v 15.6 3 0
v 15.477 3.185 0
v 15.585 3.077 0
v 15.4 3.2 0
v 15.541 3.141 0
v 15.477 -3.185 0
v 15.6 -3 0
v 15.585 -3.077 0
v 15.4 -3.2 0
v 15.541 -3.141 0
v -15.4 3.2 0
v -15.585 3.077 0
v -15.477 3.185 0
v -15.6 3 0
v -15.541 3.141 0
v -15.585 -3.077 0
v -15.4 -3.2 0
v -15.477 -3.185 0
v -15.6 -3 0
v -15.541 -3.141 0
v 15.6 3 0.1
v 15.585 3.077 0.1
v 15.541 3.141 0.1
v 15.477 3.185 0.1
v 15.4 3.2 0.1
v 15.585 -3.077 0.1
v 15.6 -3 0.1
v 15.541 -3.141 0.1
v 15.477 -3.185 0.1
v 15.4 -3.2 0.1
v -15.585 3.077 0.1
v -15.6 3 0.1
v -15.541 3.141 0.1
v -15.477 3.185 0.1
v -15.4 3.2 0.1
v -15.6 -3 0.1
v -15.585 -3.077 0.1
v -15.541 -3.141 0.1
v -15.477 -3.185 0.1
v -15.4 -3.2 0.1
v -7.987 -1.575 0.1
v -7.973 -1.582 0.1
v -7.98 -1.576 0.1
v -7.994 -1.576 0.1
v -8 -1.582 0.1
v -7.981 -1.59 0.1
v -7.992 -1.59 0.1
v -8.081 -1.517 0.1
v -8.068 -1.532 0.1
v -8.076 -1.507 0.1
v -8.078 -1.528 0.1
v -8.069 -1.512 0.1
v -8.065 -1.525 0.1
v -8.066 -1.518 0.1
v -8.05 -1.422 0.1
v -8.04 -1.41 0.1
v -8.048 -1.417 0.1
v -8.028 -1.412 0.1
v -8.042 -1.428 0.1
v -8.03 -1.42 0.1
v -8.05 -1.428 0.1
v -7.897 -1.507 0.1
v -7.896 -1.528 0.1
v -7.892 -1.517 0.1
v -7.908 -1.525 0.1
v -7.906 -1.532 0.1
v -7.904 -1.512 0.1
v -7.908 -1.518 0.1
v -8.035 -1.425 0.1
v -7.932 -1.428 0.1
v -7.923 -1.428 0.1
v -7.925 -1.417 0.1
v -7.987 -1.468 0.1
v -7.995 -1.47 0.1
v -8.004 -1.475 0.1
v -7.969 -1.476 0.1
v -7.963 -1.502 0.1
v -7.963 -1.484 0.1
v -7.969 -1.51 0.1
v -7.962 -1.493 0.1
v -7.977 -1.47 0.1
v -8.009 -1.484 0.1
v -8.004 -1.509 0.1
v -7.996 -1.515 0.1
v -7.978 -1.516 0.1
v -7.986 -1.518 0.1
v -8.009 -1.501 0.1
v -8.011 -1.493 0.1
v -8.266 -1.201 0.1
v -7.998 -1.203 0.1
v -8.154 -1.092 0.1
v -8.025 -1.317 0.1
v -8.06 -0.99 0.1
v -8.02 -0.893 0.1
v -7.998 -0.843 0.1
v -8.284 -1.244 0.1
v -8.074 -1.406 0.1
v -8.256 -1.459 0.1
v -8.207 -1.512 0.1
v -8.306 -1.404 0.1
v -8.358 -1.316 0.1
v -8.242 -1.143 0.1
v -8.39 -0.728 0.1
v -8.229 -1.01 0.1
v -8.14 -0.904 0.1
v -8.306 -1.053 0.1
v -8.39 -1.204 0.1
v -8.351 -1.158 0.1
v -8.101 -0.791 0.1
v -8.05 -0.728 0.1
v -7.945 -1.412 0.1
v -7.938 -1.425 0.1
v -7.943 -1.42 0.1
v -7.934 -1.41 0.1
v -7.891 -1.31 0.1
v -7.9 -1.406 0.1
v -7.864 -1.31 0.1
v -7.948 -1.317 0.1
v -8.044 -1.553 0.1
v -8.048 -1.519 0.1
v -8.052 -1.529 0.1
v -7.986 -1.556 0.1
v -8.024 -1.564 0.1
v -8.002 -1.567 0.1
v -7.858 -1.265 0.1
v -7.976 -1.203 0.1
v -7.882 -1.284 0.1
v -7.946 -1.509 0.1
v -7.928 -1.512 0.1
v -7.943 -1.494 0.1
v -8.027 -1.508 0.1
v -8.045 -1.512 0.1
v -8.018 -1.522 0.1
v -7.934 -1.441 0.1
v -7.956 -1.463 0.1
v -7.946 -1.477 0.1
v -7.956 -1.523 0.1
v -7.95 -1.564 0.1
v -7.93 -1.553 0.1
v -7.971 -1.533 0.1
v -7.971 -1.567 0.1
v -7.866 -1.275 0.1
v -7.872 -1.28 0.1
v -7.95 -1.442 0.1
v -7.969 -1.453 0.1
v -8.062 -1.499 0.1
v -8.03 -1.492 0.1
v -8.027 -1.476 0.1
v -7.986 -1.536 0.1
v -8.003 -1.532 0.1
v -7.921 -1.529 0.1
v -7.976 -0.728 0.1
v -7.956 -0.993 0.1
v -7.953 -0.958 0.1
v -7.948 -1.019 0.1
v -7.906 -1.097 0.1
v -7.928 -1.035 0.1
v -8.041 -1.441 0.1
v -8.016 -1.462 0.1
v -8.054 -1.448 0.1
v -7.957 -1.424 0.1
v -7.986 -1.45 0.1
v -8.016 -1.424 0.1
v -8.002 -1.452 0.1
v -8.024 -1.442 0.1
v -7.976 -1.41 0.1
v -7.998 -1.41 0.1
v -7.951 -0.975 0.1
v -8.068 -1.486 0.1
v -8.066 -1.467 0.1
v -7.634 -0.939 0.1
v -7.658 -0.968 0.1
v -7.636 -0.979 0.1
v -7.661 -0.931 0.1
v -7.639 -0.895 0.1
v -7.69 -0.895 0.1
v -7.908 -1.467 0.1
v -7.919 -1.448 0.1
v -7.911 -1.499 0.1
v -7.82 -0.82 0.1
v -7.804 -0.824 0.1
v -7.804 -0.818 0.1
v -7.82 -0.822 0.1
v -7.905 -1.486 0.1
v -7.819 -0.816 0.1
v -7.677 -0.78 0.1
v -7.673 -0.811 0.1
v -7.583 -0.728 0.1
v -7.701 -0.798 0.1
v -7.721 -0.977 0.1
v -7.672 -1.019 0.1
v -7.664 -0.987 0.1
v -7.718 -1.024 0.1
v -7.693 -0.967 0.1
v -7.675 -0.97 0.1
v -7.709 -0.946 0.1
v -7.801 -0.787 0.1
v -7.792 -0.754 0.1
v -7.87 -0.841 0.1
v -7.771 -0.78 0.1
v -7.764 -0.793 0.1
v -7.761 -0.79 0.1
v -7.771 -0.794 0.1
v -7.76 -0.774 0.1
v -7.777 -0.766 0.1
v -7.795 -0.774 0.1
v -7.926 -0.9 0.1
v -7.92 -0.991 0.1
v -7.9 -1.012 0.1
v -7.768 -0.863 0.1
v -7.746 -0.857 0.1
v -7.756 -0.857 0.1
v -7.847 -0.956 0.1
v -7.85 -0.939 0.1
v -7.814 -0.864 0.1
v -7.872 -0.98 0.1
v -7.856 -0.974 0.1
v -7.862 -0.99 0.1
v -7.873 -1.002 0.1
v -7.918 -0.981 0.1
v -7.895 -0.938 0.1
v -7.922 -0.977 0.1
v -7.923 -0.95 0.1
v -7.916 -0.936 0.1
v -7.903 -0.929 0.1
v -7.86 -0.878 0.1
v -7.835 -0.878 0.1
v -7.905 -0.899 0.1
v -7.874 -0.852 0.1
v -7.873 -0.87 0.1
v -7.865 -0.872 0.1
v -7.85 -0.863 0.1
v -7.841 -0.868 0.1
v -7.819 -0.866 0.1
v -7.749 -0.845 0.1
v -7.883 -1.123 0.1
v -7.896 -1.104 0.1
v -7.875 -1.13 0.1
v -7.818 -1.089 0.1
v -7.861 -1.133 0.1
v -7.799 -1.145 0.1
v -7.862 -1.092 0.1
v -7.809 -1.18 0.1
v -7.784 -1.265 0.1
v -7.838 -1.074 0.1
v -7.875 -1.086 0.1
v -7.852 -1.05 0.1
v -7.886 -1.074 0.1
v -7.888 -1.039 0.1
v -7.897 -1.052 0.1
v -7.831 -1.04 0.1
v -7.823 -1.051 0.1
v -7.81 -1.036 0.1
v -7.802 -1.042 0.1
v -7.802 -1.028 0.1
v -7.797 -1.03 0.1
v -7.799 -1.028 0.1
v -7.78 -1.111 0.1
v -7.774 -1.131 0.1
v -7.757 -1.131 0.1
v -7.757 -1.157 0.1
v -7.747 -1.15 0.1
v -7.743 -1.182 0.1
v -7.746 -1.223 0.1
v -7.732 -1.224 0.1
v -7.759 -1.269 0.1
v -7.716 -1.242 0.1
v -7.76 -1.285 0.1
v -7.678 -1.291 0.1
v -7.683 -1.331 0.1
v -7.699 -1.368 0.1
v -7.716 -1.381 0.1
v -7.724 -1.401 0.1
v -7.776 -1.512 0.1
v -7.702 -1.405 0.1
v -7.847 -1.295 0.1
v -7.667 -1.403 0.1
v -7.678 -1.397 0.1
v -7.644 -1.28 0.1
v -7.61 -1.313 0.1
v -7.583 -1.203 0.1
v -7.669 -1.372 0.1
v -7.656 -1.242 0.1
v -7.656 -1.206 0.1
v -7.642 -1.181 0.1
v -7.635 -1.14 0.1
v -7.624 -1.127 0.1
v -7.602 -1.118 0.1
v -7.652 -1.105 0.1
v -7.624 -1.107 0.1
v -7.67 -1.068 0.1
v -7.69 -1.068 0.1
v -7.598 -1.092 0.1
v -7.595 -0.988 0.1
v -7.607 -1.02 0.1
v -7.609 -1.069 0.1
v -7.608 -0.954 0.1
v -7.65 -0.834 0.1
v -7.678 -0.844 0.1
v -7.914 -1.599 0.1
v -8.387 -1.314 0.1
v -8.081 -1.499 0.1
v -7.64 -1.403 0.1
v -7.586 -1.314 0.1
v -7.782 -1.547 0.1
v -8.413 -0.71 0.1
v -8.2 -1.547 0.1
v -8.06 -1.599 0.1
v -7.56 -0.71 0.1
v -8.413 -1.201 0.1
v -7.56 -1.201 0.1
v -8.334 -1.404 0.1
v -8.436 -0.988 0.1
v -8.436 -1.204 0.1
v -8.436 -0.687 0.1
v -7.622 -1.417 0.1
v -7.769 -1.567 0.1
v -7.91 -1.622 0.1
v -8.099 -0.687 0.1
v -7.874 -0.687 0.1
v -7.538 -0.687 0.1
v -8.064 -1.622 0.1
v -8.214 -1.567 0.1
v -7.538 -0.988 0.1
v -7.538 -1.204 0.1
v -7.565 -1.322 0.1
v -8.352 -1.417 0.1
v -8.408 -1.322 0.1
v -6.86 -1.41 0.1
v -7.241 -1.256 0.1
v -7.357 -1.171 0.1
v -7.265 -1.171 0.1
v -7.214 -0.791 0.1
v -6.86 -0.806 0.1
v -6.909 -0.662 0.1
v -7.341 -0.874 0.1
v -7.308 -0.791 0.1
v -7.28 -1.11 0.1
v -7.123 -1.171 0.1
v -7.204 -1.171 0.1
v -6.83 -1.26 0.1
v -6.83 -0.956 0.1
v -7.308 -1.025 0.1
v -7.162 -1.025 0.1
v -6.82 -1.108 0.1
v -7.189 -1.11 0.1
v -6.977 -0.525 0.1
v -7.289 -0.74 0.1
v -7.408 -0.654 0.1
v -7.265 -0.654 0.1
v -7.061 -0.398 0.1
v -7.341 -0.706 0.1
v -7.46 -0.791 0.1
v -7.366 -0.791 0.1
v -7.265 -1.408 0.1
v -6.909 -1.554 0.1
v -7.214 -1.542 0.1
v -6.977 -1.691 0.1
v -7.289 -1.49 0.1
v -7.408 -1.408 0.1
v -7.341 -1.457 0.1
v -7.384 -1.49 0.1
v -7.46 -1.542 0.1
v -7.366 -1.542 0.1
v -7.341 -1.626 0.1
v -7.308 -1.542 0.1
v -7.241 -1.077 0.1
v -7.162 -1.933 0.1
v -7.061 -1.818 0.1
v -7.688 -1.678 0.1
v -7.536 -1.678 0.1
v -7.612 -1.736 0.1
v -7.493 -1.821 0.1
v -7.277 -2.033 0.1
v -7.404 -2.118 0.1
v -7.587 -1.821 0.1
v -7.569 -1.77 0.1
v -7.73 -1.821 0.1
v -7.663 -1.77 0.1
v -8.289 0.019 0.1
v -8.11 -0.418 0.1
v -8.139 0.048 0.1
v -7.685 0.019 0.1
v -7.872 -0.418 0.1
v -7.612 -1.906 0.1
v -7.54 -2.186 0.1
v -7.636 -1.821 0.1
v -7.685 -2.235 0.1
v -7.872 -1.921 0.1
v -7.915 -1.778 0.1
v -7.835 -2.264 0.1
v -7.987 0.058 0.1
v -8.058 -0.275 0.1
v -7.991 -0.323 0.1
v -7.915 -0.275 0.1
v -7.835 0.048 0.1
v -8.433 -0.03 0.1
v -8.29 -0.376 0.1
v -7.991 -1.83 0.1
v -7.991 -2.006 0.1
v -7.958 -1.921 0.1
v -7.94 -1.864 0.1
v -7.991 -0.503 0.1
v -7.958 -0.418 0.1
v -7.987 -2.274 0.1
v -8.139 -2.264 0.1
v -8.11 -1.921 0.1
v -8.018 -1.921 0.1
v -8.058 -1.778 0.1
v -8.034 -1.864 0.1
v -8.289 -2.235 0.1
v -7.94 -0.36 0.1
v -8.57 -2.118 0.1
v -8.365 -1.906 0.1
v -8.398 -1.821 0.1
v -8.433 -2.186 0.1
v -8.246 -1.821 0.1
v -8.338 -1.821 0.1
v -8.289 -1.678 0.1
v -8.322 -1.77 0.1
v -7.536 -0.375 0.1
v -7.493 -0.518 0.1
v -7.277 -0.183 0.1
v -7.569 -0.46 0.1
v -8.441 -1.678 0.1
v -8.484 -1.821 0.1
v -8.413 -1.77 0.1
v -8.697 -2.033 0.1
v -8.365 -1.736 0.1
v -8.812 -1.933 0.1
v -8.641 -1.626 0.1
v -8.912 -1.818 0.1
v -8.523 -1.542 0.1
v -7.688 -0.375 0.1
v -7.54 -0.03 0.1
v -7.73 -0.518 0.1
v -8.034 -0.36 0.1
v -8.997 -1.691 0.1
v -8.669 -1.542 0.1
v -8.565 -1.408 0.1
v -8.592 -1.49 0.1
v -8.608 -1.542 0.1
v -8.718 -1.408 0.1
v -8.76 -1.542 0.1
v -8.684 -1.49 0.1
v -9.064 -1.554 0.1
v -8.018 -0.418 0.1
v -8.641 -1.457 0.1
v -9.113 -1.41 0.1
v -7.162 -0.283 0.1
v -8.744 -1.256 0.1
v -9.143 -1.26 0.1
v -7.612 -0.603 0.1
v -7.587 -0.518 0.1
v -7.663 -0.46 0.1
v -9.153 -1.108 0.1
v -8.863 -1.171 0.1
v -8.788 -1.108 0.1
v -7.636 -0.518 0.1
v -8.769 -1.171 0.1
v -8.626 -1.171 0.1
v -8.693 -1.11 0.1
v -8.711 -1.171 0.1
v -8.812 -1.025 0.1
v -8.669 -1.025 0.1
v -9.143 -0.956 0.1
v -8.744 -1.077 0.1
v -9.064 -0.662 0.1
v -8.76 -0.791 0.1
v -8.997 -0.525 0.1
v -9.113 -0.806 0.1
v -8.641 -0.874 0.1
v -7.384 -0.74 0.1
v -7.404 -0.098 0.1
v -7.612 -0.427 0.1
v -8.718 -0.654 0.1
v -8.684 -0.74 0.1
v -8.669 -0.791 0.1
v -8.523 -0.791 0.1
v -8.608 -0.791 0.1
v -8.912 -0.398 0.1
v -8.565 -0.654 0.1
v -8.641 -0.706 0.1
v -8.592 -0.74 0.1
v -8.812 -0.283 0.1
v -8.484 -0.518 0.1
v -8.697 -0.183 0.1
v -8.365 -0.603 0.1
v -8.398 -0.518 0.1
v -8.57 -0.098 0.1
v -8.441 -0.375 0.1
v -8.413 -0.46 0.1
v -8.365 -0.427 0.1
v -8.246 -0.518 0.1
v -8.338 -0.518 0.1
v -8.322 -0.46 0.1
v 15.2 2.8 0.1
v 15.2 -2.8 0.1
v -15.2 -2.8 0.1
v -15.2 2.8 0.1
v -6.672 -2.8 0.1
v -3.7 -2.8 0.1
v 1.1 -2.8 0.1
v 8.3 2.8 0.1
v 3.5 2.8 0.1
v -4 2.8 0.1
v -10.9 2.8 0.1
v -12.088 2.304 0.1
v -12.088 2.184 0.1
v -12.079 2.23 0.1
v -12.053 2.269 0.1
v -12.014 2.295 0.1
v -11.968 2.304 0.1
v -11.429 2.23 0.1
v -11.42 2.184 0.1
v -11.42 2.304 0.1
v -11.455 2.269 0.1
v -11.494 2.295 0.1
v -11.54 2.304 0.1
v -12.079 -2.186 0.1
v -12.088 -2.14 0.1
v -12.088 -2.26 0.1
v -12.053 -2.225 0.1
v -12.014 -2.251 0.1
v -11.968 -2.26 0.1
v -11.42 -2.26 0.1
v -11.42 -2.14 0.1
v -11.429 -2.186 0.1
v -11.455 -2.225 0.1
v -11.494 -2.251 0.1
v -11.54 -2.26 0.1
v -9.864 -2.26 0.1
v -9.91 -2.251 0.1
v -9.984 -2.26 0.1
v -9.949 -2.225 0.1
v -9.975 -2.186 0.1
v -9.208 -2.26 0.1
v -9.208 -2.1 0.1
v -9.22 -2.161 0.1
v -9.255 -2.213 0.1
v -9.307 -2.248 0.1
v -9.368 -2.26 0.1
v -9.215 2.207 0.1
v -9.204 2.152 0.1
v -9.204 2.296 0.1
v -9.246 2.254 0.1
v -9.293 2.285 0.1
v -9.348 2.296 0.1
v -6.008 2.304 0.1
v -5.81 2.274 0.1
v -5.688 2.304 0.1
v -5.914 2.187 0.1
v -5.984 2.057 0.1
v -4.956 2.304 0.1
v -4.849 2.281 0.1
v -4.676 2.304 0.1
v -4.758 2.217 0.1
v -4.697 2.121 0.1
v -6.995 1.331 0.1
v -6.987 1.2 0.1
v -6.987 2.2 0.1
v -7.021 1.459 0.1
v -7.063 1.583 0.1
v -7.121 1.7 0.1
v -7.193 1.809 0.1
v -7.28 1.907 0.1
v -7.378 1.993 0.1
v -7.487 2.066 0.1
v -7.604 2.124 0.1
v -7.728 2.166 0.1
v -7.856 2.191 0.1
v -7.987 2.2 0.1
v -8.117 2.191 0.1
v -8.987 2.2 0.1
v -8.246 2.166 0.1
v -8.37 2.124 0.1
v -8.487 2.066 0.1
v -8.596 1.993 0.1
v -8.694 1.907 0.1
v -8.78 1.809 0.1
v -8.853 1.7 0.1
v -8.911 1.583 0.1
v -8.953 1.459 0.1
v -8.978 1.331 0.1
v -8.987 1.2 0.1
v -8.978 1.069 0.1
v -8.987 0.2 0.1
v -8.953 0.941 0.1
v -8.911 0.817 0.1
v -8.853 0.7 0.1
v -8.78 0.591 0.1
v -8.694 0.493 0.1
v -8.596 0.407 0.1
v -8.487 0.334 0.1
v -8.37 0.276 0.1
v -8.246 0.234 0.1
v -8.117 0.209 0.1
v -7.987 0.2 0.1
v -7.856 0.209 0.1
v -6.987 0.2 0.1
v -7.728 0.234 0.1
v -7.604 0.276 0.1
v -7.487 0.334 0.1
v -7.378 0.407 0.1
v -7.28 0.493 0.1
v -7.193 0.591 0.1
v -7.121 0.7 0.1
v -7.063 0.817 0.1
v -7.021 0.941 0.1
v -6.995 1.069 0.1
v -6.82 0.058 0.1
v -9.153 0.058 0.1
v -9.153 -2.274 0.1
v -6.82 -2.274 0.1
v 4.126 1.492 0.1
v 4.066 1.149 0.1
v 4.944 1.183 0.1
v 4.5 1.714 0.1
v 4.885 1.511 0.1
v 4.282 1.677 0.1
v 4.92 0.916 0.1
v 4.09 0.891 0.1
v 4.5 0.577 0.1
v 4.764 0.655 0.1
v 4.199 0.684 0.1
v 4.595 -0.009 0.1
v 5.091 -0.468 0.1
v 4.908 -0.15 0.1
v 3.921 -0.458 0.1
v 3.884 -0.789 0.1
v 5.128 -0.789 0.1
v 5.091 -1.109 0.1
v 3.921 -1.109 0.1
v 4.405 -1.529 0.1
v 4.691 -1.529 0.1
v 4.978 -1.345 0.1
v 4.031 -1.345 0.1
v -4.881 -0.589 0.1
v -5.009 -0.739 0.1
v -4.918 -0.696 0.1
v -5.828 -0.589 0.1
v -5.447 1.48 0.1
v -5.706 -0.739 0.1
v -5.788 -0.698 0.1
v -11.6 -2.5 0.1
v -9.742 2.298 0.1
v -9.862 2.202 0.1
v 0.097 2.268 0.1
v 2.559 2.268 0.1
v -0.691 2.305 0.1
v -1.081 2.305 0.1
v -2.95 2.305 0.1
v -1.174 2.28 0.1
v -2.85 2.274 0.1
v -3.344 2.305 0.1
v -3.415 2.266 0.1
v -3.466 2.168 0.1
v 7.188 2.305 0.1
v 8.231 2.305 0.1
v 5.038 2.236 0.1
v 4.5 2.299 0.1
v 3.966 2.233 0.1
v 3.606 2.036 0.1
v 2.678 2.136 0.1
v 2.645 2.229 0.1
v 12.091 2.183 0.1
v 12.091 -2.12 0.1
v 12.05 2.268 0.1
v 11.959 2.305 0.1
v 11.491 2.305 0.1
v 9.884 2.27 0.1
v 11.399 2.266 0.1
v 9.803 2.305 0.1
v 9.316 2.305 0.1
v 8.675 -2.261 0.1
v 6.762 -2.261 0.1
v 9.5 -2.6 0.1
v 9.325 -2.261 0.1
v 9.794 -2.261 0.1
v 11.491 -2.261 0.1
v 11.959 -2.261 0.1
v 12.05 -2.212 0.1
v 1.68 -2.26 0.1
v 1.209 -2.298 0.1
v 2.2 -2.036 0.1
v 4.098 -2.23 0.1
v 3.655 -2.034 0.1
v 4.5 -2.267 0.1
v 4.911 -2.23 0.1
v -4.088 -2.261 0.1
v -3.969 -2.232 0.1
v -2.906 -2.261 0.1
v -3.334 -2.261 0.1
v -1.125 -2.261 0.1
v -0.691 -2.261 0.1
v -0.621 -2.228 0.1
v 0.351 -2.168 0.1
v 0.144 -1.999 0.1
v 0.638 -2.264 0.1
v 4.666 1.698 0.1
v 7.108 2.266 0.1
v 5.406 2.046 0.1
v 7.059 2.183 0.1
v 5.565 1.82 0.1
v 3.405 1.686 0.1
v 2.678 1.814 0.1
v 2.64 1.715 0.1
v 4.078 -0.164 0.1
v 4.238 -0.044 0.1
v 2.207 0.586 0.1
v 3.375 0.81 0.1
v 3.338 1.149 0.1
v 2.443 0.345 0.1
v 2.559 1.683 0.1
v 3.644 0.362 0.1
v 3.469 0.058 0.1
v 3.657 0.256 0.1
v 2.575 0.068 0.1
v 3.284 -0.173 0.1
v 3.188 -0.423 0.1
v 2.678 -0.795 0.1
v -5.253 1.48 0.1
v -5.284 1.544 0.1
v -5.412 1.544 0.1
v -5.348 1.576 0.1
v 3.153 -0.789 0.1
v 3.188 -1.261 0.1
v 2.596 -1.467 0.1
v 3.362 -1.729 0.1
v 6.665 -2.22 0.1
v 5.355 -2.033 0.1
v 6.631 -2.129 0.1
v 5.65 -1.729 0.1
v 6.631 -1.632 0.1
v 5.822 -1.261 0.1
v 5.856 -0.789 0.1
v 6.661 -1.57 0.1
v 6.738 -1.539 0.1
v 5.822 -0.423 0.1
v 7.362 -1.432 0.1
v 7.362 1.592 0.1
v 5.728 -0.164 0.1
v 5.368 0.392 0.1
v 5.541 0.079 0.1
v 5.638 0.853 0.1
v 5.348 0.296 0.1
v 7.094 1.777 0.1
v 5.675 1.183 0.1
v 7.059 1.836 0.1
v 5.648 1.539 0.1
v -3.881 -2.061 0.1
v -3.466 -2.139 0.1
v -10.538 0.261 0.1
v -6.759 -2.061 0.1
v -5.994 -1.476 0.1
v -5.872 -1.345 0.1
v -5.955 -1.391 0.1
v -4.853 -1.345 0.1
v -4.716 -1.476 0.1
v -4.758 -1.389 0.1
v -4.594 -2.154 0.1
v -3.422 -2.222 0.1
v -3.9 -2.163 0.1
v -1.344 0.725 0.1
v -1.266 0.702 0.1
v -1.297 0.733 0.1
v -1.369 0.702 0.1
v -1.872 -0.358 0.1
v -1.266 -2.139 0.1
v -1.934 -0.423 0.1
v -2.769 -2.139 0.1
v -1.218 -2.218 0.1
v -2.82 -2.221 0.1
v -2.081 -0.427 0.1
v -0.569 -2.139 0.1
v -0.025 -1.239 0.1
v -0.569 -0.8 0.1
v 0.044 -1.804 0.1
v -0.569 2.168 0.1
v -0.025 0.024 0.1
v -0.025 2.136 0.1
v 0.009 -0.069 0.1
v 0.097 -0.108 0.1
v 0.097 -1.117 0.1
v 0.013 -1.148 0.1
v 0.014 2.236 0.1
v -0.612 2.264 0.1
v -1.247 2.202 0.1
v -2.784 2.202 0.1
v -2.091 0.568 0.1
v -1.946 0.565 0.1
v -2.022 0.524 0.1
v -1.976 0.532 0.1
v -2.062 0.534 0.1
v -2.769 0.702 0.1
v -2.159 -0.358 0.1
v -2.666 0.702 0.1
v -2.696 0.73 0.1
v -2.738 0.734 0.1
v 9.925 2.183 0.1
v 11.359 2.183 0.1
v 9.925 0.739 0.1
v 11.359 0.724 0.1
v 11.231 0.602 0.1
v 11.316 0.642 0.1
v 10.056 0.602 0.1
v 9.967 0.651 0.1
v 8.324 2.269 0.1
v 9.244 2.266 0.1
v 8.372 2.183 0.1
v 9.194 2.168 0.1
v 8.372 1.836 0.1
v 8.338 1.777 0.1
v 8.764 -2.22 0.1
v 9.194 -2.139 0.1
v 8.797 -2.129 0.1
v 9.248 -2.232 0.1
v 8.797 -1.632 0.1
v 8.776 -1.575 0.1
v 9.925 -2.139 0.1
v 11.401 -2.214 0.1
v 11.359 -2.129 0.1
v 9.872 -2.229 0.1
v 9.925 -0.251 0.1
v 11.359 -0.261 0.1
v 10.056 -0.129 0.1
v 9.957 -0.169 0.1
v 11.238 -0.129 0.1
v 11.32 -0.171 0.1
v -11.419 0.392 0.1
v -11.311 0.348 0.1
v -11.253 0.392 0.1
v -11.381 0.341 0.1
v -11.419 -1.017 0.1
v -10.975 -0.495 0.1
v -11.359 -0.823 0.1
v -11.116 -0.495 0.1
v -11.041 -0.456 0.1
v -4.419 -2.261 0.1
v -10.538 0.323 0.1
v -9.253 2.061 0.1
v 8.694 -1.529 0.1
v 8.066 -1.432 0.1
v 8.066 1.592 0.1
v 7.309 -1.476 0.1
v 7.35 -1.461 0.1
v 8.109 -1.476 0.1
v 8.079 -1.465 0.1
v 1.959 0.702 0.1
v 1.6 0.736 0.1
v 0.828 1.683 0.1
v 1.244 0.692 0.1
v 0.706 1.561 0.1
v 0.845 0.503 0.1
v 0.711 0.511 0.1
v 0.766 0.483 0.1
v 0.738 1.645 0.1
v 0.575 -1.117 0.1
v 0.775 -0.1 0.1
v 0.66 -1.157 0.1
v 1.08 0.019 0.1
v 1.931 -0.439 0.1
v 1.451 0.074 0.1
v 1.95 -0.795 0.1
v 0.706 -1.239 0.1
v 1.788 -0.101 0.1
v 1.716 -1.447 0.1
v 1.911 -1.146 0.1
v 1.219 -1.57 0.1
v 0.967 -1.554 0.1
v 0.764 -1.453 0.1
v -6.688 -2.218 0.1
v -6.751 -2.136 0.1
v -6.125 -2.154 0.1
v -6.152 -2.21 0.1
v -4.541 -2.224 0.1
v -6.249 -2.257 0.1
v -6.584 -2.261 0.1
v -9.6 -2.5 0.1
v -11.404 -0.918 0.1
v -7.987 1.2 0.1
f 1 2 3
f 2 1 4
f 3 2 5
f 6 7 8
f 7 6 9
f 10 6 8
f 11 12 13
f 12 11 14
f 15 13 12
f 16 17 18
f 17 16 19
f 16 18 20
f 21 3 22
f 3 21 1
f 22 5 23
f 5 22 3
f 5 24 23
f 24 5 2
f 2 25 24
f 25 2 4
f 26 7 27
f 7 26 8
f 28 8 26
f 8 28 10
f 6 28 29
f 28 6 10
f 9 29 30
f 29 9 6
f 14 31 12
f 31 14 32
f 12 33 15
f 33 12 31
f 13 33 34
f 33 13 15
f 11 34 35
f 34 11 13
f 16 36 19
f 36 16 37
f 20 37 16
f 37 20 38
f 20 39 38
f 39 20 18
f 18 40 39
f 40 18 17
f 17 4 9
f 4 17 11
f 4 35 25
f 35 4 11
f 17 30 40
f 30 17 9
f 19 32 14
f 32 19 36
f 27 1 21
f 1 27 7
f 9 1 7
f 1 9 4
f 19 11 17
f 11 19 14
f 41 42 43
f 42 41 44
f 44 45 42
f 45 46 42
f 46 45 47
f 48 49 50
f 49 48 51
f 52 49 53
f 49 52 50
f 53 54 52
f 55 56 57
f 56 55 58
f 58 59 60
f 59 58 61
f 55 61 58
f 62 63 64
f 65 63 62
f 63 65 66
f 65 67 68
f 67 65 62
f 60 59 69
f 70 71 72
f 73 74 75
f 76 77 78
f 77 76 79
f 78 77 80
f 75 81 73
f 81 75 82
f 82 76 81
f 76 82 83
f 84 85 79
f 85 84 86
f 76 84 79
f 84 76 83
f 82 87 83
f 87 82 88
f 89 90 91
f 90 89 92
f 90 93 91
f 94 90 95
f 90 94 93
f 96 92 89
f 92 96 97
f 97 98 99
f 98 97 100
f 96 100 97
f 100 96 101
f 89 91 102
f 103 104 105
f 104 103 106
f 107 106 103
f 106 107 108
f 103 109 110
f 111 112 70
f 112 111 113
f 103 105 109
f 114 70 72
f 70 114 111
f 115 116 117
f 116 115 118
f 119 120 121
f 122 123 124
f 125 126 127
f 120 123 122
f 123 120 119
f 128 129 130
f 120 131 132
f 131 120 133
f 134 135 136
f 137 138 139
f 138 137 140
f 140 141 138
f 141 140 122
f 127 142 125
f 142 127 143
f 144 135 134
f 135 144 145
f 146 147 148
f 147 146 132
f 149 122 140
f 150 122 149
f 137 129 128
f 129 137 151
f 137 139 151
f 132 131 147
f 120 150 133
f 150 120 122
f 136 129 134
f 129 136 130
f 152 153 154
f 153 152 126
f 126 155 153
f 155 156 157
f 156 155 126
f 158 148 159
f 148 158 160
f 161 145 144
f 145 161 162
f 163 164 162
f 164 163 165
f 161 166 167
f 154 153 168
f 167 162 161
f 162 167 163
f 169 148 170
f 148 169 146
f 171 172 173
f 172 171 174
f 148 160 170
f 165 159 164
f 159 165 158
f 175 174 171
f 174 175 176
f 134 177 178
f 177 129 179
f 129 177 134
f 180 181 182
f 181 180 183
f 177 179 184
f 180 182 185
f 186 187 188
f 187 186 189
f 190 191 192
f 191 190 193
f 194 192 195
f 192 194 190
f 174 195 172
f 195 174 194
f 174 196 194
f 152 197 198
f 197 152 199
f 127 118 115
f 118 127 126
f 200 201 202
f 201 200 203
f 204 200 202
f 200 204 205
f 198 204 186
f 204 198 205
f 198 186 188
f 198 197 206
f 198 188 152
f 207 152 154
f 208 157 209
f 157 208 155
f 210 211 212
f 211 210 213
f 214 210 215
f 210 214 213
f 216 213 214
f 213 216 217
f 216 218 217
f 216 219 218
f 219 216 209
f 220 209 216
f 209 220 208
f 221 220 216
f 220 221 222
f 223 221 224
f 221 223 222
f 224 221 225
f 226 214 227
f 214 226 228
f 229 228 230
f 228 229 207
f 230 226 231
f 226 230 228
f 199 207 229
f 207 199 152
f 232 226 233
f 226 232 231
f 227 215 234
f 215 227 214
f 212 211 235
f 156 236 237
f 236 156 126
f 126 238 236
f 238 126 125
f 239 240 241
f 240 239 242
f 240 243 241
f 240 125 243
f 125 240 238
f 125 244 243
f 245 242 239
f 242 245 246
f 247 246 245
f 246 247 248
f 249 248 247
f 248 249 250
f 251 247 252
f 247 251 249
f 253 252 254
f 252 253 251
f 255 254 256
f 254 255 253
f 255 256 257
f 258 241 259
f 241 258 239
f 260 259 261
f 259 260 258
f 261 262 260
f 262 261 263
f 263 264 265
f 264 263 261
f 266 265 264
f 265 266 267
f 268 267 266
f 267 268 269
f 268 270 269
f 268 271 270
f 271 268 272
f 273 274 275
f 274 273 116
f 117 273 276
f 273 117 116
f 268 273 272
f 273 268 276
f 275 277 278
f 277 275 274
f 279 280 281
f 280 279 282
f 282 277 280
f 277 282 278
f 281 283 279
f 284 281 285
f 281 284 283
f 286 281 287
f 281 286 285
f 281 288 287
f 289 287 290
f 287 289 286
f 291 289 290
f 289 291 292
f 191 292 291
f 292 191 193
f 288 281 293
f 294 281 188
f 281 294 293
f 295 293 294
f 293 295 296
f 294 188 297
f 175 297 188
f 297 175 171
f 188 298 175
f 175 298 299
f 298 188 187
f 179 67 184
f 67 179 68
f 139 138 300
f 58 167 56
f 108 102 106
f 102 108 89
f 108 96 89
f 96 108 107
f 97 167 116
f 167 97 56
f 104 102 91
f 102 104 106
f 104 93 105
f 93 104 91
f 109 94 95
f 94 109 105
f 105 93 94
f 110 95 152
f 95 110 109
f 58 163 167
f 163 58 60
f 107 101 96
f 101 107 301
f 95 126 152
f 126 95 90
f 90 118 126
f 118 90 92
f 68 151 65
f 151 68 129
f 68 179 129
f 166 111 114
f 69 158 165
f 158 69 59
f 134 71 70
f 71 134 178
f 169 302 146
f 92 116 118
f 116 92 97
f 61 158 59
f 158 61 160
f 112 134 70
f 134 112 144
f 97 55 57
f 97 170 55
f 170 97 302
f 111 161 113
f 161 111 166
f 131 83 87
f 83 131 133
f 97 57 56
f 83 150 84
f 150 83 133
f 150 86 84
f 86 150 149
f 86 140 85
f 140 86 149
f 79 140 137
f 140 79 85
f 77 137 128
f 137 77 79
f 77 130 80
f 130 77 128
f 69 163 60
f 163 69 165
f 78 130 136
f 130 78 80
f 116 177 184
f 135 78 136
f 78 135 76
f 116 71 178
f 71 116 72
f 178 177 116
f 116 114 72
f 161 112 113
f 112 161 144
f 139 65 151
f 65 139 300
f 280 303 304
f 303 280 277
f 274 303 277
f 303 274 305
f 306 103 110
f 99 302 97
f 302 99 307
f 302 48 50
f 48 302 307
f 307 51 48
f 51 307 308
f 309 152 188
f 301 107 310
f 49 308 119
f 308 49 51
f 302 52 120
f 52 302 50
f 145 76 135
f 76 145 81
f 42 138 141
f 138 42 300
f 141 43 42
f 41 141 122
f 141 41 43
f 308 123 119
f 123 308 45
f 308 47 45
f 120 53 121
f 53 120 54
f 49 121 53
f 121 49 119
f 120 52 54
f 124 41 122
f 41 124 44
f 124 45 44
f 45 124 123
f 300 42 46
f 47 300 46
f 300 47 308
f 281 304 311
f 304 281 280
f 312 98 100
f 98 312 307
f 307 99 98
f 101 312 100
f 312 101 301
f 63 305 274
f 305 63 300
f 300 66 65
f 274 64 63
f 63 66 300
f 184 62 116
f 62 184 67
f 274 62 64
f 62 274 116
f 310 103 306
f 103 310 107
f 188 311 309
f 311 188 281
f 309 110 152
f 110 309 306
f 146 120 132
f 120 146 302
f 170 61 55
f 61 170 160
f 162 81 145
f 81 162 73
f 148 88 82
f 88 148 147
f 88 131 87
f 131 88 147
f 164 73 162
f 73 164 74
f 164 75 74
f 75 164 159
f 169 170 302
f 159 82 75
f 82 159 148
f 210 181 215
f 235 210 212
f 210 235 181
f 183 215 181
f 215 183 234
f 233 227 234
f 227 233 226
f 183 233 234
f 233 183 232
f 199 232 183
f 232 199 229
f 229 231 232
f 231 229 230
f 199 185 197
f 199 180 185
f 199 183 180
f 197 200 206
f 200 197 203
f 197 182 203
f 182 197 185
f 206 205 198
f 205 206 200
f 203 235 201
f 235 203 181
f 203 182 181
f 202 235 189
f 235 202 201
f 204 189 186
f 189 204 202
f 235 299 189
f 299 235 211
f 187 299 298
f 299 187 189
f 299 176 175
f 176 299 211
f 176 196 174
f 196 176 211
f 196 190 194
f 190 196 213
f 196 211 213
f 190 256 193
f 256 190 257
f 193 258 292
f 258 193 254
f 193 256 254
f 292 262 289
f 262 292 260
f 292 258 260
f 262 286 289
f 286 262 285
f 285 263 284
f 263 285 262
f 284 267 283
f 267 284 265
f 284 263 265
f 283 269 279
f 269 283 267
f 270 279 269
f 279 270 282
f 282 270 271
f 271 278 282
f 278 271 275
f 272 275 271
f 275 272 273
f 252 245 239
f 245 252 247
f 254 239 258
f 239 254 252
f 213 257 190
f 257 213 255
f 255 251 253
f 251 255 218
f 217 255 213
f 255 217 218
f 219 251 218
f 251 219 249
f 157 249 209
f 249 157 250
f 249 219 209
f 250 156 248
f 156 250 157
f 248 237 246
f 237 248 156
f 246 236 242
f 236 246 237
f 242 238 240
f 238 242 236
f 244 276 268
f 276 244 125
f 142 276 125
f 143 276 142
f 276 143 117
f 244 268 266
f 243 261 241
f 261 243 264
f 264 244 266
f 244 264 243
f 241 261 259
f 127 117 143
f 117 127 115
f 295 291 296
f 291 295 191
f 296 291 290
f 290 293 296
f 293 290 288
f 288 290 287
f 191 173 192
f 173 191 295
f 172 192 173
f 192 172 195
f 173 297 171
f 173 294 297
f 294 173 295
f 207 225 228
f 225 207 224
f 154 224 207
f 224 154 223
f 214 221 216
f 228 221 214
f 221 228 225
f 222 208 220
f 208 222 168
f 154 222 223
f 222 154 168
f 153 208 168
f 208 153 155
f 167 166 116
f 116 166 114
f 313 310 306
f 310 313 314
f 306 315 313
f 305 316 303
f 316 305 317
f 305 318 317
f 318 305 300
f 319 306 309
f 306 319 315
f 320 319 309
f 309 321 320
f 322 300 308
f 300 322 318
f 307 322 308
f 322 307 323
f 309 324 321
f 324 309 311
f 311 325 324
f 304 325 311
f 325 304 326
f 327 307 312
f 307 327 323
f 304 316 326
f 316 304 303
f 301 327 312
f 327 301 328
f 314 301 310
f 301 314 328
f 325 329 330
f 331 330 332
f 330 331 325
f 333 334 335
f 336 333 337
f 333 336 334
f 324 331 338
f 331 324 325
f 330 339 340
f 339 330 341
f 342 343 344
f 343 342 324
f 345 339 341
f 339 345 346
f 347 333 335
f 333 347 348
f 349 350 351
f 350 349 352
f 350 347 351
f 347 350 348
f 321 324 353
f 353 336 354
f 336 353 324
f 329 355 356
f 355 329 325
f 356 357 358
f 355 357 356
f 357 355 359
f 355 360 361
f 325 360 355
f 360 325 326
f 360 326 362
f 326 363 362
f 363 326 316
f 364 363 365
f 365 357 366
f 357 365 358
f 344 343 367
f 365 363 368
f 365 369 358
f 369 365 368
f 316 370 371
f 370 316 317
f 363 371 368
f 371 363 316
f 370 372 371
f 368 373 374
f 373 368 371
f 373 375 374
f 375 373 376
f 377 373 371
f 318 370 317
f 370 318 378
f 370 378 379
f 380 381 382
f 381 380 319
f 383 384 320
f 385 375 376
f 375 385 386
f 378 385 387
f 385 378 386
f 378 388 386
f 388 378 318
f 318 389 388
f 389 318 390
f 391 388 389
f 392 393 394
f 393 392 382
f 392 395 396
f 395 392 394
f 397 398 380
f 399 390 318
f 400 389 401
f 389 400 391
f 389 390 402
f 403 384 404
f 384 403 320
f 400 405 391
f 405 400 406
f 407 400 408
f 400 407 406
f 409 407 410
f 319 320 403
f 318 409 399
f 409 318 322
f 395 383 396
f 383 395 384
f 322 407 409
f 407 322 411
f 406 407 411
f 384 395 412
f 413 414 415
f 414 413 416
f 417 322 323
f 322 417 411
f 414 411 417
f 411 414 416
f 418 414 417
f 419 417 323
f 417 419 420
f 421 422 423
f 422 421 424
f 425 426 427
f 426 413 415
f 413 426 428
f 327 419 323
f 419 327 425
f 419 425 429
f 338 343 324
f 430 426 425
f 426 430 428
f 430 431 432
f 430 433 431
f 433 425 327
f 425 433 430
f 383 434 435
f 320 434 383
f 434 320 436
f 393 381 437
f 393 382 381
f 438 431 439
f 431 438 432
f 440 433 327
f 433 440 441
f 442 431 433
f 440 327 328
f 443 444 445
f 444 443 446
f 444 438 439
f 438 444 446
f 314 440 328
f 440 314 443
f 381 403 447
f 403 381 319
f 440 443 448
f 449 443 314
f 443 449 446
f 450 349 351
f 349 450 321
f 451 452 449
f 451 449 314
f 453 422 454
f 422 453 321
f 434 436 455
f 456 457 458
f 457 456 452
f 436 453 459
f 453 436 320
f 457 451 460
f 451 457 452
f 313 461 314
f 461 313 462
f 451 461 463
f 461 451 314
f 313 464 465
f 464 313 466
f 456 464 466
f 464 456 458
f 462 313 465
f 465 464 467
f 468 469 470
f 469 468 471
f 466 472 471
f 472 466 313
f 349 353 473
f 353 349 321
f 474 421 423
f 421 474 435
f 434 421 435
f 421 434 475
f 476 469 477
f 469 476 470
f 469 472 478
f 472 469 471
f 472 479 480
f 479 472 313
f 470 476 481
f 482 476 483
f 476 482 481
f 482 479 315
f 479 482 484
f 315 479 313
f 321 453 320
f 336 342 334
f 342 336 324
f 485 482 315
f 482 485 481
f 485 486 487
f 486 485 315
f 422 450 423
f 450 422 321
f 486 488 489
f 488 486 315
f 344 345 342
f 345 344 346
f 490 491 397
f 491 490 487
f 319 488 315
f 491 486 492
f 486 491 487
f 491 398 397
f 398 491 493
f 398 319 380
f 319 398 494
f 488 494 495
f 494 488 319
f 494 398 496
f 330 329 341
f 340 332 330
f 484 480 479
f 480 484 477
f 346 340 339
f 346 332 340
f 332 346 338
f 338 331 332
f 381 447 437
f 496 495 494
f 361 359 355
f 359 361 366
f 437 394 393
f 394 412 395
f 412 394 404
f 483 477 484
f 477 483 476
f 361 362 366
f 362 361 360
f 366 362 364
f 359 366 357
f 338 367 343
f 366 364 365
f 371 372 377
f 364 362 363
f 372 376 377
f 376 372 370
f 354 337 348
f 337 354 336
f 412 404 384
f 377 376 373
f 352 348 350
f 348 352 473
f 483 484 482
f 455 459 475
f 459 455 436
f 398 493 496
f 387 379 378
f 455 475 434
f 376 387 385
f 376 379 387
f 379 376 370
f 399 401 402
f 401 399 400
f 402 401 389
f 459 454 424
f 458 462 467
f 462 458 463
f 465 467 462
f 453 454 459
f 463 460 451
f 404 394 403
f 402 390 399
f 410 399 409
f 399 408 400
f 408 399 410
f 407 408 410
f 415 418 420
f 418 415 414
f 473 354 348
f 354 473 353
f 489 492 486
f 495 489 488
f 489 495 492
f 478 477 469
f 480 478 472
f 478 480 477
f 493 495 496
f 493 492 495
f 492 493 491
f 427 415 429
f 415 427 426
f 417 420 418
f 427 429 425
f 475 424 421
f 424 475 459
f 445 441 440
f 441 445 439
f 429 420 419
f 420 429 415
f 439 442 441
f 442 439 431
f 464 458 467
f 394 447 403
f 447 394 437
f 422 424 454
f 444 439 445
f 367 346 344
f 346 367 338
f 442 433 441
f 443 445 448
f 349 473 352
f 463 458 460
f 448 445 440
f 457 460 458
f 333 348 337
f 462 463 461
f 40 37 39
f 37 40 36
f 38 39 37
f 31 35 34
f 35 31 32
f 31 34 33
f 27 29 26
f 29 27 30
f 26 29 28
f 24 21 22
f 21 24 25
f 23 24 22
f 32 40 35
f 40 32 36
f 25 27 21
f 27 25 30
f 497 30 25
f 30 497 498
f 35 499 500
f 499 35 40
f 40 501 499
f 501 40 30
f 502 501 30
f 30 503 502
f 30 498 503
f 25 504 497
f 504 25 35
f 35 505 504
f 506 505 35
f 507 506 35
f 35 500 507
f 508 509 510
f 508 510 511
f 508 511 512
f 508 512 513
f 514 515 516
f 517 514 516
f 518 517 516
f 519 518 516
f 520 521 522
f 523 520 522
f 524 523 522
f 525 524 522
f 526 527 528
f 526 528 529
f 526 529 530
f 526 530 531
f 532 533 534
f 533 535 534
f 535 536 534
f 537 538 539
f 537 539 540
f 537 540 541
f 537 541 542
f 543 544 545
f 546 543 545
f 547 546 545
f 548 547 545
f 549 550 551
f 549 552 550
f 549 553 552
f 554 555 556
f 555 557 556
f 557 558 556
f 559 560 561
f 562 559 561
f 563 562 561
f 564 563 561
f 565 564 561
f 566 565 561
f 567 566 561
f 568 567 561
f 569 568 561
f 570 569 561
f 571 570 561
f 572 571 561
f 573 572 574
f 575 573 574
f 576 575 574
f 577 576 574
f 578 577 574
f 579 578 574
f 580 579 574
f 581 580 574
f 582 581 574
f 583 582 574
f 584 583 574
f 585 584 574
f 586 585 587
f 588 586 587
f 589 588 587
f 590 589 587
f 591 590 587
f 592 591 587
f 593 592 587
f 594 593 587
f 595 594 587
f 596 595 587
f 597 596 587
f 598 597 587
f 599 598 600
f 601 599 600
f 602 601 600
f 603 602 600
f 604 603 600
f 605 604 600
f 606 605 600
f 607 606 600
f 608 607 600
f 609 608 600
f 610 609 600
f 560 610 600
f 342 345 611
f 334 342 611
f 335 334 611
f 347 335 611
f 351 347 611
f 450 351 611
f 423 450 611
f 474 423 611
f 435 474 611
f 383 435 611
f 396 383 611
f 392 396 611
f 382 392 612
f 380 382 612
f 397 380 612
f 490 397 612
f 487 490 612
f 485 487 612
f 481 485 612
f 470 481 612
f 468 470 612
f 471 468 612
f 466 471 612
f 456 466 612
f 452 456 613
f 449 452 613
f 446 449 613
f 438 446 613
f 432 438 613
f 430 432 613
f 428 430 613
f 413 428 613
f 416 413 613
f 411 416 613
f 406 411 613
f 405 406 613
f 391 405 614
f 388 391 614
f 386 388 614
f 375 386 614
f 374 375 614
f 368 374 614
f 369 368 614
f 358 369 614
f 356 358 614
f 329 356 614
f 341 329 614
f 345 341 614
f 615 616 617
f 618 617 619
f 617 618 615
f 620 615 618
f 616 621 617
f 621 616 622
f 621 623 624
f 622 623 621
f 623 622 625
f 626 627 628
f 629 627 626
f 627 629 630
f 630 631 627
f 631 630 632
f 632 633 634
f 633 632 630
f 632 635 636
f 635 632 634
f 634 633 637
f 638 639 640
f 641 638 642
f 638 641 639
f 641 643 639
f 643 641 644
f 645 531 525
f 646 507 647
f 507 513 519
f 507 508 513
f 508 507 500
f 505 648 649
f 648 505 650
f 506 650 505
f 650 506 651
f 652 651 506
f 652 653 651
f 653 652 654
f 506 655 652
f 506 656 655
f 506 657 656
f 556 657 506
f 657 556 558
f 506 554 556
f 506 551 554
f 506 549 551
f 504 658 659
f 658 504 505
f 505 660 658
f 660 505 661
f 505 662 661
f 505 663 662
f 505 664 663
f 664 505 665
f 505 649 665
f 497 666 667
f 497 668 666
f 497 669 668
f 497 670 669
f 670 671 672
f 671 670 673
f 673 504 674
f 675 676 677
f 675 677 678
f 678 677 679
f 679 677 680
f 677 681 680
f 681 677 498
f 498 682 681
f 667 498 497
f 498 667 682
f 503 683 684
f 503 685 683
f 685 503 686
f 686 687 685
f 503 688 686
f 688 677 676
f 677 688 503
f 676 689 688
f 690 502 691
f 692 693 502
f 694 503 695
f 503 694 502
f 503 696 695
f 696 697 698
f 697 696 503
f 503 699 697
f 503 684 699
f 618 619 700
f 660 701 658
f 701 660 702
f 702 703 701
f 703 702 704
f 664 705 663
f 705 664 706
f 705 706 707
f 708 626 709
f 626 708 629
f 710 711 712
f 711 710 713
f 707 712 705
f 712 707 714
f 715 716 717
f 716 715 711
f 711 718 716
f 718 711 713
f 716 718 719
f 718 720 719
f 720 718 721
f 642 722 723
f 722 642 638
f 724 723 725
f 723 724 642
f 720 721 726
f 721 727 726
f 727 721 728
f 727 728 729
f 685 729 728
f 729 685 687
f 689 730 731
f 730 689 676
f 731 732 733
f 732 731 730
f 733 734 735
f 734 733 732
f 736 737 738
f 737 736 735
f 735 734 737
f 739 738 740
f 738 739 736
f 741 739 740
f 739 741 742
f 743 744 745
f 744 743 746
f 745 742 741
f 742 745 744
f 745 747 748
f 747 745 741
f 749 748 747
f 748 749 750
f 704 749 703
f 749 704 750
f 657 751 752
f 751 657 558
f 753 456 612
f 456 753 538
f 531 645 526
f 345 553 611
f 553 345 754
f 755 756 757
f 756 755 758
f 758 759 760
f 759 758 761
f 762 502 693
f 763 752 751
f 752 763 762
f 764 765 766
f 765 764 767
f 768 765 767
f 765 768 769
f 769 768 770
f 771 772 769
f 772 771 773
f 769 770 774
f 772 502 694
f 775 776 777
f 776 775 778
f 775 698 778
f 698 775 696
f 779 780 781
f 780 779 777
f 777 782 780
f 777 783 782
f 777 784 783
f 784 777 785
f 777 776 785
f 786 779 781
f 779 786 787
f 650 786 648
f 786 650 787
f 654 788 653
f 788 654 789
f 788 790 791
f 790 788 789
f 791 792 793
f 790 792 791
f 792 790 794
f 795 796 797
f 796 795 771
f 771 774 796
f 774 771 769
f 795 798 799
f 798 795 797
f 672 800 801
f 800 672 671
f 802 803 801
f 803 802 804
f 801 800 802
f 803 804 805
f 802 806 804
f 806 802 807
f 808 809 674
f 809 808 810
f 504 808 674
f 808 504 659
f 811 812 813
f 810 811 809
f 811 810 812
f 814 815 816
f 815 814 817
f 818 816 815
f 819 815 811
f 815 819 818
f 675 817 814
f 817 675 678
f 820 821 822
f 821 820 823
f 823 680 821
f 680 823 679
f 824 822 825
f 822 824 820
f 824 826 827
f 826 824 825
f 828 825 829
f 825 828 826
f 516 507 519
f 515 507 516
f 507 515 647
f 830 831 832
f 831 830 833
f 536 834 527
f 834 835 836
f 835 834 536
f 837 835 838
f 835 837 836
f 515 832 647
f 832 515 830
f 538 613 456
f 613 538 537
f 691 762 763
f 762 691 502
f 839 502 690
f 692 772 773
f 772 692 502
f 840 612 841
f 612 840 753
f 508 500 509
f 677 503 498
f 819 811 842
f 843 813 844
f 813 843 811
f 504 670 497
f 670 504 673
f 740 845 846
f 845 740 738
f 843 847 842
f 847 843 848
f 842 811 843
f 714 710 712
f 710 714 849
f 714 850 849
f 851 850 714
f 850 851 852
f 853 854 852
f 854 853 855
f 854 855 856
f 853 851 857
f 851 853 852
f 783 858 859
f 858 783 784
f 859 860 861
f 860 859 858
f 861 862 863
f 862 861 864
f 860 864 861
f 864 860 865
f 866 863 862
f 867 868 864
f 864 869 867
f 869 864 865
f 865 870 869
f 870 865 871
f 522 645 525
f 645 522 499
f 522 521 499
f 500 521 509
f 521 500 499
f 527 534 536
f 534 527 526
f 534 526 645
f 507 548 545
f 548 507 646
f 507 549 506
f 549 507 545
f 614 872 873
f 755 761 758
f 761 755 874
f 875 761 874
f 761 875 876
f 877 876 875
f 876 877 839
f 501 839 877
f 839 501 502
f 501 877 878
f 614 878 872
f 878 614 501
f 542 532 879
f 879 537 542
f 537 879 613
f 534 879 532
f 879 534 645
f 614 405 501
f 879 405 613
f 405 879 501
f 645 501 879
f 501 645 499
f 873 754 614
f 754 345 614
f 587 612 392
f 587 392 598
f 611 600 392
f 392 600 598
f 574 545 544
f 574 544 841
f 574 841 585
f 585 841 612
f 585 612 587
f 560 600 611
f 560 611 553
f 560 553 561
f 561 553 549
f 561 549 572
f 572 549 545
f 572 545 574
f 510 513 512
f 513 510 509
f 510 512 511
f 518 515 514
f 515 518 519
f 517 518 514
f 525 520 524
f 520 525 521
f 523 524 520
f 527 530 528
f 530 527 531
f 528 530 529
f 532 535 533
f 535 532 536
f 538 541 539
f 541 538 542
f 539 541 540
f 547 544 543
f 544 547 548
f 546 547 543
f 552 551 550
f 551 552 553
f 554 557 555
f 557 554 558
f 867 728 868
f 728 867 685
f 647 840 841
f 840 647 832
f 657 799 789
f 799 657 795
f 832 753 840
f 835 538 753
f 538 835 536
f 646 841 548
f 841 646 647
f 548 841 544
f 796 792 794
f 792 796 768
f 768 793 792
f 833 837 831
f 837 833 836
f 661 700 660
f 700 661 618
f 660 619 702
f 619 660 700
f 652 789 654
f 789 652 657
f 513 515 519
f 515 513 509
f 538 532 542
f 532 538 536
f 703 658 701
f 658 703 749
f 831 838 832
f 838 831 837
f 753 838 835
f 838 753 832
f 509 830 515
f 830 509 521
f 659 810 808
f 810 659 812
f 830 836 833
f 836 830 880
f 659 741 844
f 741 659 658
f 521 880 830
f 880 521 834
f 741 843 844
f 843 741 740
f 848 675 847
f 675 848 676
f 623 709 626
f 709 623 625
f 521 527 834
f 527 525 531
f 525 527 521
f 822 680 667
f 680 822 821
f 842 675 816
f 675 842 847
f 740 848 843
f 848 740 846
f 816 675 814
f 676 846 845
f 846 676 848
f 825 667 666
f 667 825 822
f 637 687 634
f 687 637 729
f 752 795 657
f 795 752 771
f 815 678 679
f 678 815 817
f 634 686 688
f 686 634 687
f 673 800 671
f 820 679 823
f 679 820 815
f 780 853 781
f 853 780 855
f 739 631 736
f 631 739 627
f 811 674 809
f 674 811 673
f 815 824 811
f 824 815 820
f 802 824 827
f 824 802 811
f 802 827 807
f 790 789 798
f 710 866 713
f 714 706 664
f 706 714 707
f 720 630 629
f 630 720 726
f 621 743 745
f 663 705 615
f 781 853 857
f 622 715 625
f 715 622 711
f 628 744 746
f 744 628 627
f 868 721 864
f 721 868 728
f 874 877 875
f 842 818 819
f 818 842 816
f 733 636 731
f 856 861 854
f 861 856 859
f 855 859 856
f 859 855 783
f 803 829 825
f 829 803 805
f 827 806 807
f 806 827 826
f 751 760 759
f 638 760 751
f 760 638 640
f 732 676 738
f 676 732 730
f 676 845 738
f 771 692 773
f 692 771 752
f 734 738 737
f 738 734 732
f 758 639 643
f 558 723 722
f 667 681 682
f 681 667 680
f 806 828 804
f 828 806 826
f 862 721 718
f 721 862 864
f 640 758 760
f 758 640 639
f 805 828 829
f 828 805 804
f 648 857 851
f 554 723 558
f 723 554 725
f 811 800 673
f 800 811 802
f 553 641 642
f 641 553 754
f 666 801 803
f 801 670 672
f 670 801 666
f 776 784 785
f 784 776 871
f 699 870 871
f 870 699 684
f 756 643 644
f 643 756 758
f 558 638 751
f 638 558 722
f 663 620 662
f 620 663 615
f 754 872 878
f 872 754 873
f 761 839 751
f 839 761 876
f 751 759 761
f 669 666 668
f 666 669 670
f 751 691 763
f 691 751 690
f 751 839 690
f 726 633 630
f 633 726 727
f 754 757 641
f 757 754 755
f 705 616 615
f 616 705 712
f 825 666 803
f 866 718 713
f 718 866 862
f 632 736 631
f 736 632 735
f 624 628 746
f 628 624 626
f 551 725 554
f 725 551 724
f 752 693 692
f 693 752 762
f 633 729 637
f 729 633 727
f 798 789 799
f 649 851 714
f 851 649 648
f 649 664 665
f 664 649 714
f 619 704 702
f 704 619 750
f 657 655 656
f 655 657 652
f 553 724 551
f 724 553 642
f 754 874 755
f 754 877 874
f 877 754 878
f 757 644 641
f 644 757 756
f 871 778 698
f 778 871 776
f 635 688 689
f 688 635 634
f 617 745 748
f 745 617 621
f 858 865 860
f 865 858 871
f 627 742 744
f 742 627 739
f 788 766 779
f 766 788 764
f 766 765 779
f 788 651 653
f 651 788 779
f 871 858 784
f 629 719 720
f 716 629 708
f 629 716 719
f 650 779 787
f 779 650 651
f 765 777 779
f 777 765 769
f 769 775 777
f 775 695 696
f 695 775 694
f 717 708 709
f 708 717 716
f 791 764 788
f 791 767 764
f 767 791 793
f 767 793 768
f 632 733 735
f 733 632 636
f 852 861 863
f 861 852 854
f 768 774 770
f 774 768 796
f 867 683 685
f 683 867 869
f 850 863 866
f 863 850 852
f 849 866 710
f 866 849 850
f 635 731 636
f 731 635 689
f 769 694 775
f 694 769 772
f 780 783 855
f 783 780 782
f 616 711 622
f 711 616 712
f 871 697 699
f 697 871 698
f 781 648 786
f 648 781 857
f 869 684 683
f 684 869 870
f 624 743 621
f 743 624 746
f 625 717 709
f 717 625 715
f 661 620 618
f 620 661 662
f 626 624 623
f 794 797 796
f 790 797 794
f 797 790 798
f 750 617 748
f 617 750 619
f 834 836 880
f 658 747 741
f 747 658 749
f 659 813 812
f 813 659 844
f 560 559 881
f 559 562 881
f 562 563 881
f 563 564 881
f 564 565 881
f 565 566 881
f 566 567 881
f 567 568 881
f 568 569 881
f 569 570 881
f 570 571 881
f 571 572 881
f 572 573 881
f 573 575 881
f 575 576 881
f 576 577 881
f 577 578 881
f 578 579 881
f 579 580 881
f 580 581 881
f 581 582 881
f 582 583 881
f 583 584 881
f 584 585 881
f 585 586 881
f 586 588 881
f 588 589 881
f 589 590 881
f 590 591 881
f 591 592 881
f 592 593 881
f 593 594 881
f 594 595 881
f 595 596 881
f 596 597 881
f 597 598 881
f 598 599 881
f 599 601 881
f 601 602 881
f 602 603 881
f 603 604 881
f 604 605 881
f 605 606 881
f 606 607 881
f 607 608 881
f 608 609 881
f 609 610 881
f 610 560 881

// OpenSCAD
use <../lib.scad>
use <../p/1-4chrd.scad>
use <../p/1-4cyli.scad>
use <../p/48/4-4disc.scad>
use <../p/box3u12.scad>
use <s/6258203is01.scad>
$fa=1; $fs=0.2;
function ldraw_lib__6258203h(realsolid=false) = [
// 0 Sticker  0.8 x  3.9 with German Front License Plate "K AM58IH"
// 0 Name: 6258203h.dat
// 0 Author: Ulrich Röder [UR]
// 0 !LDRAW_ORG Part UPDATE 2019-01
// 0 !LICENSE Licensed under CC BY 2.0 and CC BY 4.0 : see CAreadme.txt
// 
// 0 BFC CERTIFY CCW
  [0,"BFC","CERTIFY"],
  [0,"BFC","CCW"],
// 
// 0 !KEYWORDS Ford, Mustang, Set 10265
// 
// 0 !HISTORY 2019-06-28 [PTadmin] Official Update 2019-01
// 
// 
// 0 // Main
// 0 // Box Rounded
// 1 16 38.5 0 7.5 .5 0 0 0 -1 0 0 0 .5 1-4chrd.dat
  [1,16,38.5,0,7.5,.5,0,0,0,-1,0,0,0,.5, ldraw_lib__1_4chrd(realsolid)],
// 1 16 38.5 0 -7.5 .5 0 0 0 -1 0 0 0 -.5 1-4chrd.dat
  [1,16,38.5,0,-7.5,.5,0,0,0,-1,0,0,0,-.5, ldraw_lib__1_4chrd(realsolid)],
// 1 16 -38.5 0 7.5 -.5 0 0 0 -1 0 0 0 .5 1-4chrd.dat
  [1,16,-38.5,0,7.5,-.5,0,0,0,-1,0,0,0,.5, ldraw_lib__1_4chrd(realsolid)],
// 1 16 -38.5 0 -7.5 -.5 0 0 0 -1 0 0 0 -.5 1-4chrd.dat
  [1,16,-38.5,0,-7.5,-.5,0,0,0,-1,0,0,0,-.5, ldraw_lib__1_4chrd(realsolid)],
// 1 16 38.5 0 7.5 .5 0 0 0 -.25 0 0 0 .5 1-4cyli.dat
  [1,16,38.5,0,7.5,.5,0,0,0,-.25,0,0,0,.5, ldraw_lib__1_4cyli(realsolid)],
// 1 16 38.5 0 -7.5 .5 0 0 0 -.25 0 0 0 -.5 1-4cyli.dat
  [1,16,38.5,0,-7.5,.5,0,0,0,-.25,0,0,0,-.5, ldraw_lib__1_4cyli(realsolid)],
// 1 16 -38.5 0 7.5 -.5 0 0 0 -.25 0 0 0 .5 1-4cyli.dat
  [1,16,-38.5,0,7.5,-.5,0,0,0,-.25,0,0,0,.5, ldraw_lib__1_4cyli(realsolid)],
// 1 16 -38.5 0 -7.5 -.5 0 0 0 -.25 0 0 0 -.5 1-4cyli.dat
  [1,16,-38.5,0,-7.5,-.5,0,0,0,-.25,0,0,0,-.5, ldraw_lib__1_4cyli(realsolid)],
// 1 16 0 -.25 0 38.5 0 0 0 .25 0 0 0 8 box3u12.dat
  [1,16,0,-.25,0,38.5,0,0,0,.25,0,0,0,8, ldraw_lib__box3u12(realsolid)],
// 4 16 -39 -.25 -7.5 -39 -.25 7.5 -39 0 7.5 -39 0 -7.5
  [4,16,-39,-.25,-7.5,-39,-.25,7.5,-39,0,7.5,-39,0,-7.5],
// 4 16 39 0 7.5 39 -.25 7.5 39 -.25 -7.5 39 0 -7.5
  [4,16,39,0,7.5,39,-.25,7.5,39,-.25,-7.5,39,0,-7.5],
// 4 16 39 0 7.5 39 0 -7.5 38.5 0 -8 38.5 0 8
  [4,16,39,0,7.5,39,0,-7.5,38.5,0,-8,38.5,0,8],
// 4 16 -39 0 7.5 -38.5 0 8 -38.5 0 -8 -39 0 -7.5
  [4,16,-39,0,7.5,-38.5,0,8,-38.5,0,-8,-39,0,-7.5],
// 
// 1 15 0 0 0 1 0 0 0 1 0 0 0 1 s\6258203is01.dat
  [1,15,0,0,0,1,0,0,0,1,0,0,0,1, ldraw_lib__s__6258203is01(realsolid)],
// 1 15 -19.967 -.25 3 2.5 0 0 0 1 0 0 0 2.5 48\4-4disc.dat
  [1,15,-19.967,-.25,3,2.5,0,0,0,1,0,0,0,2.5, ldraw_lib__48__4_4disc(realsolid)],
];
module ldraw_lib__6258203h(step=0, col=false, unit=2/5, alt=false, line=0.2, solid=!$preview)
    makepoly(ldraw_lib__6258203h(solid), step=step, col=col, unit=unit, alt=alt, line=line, solid=solid);
ldraw_lib__6258203h(line=0.2);
